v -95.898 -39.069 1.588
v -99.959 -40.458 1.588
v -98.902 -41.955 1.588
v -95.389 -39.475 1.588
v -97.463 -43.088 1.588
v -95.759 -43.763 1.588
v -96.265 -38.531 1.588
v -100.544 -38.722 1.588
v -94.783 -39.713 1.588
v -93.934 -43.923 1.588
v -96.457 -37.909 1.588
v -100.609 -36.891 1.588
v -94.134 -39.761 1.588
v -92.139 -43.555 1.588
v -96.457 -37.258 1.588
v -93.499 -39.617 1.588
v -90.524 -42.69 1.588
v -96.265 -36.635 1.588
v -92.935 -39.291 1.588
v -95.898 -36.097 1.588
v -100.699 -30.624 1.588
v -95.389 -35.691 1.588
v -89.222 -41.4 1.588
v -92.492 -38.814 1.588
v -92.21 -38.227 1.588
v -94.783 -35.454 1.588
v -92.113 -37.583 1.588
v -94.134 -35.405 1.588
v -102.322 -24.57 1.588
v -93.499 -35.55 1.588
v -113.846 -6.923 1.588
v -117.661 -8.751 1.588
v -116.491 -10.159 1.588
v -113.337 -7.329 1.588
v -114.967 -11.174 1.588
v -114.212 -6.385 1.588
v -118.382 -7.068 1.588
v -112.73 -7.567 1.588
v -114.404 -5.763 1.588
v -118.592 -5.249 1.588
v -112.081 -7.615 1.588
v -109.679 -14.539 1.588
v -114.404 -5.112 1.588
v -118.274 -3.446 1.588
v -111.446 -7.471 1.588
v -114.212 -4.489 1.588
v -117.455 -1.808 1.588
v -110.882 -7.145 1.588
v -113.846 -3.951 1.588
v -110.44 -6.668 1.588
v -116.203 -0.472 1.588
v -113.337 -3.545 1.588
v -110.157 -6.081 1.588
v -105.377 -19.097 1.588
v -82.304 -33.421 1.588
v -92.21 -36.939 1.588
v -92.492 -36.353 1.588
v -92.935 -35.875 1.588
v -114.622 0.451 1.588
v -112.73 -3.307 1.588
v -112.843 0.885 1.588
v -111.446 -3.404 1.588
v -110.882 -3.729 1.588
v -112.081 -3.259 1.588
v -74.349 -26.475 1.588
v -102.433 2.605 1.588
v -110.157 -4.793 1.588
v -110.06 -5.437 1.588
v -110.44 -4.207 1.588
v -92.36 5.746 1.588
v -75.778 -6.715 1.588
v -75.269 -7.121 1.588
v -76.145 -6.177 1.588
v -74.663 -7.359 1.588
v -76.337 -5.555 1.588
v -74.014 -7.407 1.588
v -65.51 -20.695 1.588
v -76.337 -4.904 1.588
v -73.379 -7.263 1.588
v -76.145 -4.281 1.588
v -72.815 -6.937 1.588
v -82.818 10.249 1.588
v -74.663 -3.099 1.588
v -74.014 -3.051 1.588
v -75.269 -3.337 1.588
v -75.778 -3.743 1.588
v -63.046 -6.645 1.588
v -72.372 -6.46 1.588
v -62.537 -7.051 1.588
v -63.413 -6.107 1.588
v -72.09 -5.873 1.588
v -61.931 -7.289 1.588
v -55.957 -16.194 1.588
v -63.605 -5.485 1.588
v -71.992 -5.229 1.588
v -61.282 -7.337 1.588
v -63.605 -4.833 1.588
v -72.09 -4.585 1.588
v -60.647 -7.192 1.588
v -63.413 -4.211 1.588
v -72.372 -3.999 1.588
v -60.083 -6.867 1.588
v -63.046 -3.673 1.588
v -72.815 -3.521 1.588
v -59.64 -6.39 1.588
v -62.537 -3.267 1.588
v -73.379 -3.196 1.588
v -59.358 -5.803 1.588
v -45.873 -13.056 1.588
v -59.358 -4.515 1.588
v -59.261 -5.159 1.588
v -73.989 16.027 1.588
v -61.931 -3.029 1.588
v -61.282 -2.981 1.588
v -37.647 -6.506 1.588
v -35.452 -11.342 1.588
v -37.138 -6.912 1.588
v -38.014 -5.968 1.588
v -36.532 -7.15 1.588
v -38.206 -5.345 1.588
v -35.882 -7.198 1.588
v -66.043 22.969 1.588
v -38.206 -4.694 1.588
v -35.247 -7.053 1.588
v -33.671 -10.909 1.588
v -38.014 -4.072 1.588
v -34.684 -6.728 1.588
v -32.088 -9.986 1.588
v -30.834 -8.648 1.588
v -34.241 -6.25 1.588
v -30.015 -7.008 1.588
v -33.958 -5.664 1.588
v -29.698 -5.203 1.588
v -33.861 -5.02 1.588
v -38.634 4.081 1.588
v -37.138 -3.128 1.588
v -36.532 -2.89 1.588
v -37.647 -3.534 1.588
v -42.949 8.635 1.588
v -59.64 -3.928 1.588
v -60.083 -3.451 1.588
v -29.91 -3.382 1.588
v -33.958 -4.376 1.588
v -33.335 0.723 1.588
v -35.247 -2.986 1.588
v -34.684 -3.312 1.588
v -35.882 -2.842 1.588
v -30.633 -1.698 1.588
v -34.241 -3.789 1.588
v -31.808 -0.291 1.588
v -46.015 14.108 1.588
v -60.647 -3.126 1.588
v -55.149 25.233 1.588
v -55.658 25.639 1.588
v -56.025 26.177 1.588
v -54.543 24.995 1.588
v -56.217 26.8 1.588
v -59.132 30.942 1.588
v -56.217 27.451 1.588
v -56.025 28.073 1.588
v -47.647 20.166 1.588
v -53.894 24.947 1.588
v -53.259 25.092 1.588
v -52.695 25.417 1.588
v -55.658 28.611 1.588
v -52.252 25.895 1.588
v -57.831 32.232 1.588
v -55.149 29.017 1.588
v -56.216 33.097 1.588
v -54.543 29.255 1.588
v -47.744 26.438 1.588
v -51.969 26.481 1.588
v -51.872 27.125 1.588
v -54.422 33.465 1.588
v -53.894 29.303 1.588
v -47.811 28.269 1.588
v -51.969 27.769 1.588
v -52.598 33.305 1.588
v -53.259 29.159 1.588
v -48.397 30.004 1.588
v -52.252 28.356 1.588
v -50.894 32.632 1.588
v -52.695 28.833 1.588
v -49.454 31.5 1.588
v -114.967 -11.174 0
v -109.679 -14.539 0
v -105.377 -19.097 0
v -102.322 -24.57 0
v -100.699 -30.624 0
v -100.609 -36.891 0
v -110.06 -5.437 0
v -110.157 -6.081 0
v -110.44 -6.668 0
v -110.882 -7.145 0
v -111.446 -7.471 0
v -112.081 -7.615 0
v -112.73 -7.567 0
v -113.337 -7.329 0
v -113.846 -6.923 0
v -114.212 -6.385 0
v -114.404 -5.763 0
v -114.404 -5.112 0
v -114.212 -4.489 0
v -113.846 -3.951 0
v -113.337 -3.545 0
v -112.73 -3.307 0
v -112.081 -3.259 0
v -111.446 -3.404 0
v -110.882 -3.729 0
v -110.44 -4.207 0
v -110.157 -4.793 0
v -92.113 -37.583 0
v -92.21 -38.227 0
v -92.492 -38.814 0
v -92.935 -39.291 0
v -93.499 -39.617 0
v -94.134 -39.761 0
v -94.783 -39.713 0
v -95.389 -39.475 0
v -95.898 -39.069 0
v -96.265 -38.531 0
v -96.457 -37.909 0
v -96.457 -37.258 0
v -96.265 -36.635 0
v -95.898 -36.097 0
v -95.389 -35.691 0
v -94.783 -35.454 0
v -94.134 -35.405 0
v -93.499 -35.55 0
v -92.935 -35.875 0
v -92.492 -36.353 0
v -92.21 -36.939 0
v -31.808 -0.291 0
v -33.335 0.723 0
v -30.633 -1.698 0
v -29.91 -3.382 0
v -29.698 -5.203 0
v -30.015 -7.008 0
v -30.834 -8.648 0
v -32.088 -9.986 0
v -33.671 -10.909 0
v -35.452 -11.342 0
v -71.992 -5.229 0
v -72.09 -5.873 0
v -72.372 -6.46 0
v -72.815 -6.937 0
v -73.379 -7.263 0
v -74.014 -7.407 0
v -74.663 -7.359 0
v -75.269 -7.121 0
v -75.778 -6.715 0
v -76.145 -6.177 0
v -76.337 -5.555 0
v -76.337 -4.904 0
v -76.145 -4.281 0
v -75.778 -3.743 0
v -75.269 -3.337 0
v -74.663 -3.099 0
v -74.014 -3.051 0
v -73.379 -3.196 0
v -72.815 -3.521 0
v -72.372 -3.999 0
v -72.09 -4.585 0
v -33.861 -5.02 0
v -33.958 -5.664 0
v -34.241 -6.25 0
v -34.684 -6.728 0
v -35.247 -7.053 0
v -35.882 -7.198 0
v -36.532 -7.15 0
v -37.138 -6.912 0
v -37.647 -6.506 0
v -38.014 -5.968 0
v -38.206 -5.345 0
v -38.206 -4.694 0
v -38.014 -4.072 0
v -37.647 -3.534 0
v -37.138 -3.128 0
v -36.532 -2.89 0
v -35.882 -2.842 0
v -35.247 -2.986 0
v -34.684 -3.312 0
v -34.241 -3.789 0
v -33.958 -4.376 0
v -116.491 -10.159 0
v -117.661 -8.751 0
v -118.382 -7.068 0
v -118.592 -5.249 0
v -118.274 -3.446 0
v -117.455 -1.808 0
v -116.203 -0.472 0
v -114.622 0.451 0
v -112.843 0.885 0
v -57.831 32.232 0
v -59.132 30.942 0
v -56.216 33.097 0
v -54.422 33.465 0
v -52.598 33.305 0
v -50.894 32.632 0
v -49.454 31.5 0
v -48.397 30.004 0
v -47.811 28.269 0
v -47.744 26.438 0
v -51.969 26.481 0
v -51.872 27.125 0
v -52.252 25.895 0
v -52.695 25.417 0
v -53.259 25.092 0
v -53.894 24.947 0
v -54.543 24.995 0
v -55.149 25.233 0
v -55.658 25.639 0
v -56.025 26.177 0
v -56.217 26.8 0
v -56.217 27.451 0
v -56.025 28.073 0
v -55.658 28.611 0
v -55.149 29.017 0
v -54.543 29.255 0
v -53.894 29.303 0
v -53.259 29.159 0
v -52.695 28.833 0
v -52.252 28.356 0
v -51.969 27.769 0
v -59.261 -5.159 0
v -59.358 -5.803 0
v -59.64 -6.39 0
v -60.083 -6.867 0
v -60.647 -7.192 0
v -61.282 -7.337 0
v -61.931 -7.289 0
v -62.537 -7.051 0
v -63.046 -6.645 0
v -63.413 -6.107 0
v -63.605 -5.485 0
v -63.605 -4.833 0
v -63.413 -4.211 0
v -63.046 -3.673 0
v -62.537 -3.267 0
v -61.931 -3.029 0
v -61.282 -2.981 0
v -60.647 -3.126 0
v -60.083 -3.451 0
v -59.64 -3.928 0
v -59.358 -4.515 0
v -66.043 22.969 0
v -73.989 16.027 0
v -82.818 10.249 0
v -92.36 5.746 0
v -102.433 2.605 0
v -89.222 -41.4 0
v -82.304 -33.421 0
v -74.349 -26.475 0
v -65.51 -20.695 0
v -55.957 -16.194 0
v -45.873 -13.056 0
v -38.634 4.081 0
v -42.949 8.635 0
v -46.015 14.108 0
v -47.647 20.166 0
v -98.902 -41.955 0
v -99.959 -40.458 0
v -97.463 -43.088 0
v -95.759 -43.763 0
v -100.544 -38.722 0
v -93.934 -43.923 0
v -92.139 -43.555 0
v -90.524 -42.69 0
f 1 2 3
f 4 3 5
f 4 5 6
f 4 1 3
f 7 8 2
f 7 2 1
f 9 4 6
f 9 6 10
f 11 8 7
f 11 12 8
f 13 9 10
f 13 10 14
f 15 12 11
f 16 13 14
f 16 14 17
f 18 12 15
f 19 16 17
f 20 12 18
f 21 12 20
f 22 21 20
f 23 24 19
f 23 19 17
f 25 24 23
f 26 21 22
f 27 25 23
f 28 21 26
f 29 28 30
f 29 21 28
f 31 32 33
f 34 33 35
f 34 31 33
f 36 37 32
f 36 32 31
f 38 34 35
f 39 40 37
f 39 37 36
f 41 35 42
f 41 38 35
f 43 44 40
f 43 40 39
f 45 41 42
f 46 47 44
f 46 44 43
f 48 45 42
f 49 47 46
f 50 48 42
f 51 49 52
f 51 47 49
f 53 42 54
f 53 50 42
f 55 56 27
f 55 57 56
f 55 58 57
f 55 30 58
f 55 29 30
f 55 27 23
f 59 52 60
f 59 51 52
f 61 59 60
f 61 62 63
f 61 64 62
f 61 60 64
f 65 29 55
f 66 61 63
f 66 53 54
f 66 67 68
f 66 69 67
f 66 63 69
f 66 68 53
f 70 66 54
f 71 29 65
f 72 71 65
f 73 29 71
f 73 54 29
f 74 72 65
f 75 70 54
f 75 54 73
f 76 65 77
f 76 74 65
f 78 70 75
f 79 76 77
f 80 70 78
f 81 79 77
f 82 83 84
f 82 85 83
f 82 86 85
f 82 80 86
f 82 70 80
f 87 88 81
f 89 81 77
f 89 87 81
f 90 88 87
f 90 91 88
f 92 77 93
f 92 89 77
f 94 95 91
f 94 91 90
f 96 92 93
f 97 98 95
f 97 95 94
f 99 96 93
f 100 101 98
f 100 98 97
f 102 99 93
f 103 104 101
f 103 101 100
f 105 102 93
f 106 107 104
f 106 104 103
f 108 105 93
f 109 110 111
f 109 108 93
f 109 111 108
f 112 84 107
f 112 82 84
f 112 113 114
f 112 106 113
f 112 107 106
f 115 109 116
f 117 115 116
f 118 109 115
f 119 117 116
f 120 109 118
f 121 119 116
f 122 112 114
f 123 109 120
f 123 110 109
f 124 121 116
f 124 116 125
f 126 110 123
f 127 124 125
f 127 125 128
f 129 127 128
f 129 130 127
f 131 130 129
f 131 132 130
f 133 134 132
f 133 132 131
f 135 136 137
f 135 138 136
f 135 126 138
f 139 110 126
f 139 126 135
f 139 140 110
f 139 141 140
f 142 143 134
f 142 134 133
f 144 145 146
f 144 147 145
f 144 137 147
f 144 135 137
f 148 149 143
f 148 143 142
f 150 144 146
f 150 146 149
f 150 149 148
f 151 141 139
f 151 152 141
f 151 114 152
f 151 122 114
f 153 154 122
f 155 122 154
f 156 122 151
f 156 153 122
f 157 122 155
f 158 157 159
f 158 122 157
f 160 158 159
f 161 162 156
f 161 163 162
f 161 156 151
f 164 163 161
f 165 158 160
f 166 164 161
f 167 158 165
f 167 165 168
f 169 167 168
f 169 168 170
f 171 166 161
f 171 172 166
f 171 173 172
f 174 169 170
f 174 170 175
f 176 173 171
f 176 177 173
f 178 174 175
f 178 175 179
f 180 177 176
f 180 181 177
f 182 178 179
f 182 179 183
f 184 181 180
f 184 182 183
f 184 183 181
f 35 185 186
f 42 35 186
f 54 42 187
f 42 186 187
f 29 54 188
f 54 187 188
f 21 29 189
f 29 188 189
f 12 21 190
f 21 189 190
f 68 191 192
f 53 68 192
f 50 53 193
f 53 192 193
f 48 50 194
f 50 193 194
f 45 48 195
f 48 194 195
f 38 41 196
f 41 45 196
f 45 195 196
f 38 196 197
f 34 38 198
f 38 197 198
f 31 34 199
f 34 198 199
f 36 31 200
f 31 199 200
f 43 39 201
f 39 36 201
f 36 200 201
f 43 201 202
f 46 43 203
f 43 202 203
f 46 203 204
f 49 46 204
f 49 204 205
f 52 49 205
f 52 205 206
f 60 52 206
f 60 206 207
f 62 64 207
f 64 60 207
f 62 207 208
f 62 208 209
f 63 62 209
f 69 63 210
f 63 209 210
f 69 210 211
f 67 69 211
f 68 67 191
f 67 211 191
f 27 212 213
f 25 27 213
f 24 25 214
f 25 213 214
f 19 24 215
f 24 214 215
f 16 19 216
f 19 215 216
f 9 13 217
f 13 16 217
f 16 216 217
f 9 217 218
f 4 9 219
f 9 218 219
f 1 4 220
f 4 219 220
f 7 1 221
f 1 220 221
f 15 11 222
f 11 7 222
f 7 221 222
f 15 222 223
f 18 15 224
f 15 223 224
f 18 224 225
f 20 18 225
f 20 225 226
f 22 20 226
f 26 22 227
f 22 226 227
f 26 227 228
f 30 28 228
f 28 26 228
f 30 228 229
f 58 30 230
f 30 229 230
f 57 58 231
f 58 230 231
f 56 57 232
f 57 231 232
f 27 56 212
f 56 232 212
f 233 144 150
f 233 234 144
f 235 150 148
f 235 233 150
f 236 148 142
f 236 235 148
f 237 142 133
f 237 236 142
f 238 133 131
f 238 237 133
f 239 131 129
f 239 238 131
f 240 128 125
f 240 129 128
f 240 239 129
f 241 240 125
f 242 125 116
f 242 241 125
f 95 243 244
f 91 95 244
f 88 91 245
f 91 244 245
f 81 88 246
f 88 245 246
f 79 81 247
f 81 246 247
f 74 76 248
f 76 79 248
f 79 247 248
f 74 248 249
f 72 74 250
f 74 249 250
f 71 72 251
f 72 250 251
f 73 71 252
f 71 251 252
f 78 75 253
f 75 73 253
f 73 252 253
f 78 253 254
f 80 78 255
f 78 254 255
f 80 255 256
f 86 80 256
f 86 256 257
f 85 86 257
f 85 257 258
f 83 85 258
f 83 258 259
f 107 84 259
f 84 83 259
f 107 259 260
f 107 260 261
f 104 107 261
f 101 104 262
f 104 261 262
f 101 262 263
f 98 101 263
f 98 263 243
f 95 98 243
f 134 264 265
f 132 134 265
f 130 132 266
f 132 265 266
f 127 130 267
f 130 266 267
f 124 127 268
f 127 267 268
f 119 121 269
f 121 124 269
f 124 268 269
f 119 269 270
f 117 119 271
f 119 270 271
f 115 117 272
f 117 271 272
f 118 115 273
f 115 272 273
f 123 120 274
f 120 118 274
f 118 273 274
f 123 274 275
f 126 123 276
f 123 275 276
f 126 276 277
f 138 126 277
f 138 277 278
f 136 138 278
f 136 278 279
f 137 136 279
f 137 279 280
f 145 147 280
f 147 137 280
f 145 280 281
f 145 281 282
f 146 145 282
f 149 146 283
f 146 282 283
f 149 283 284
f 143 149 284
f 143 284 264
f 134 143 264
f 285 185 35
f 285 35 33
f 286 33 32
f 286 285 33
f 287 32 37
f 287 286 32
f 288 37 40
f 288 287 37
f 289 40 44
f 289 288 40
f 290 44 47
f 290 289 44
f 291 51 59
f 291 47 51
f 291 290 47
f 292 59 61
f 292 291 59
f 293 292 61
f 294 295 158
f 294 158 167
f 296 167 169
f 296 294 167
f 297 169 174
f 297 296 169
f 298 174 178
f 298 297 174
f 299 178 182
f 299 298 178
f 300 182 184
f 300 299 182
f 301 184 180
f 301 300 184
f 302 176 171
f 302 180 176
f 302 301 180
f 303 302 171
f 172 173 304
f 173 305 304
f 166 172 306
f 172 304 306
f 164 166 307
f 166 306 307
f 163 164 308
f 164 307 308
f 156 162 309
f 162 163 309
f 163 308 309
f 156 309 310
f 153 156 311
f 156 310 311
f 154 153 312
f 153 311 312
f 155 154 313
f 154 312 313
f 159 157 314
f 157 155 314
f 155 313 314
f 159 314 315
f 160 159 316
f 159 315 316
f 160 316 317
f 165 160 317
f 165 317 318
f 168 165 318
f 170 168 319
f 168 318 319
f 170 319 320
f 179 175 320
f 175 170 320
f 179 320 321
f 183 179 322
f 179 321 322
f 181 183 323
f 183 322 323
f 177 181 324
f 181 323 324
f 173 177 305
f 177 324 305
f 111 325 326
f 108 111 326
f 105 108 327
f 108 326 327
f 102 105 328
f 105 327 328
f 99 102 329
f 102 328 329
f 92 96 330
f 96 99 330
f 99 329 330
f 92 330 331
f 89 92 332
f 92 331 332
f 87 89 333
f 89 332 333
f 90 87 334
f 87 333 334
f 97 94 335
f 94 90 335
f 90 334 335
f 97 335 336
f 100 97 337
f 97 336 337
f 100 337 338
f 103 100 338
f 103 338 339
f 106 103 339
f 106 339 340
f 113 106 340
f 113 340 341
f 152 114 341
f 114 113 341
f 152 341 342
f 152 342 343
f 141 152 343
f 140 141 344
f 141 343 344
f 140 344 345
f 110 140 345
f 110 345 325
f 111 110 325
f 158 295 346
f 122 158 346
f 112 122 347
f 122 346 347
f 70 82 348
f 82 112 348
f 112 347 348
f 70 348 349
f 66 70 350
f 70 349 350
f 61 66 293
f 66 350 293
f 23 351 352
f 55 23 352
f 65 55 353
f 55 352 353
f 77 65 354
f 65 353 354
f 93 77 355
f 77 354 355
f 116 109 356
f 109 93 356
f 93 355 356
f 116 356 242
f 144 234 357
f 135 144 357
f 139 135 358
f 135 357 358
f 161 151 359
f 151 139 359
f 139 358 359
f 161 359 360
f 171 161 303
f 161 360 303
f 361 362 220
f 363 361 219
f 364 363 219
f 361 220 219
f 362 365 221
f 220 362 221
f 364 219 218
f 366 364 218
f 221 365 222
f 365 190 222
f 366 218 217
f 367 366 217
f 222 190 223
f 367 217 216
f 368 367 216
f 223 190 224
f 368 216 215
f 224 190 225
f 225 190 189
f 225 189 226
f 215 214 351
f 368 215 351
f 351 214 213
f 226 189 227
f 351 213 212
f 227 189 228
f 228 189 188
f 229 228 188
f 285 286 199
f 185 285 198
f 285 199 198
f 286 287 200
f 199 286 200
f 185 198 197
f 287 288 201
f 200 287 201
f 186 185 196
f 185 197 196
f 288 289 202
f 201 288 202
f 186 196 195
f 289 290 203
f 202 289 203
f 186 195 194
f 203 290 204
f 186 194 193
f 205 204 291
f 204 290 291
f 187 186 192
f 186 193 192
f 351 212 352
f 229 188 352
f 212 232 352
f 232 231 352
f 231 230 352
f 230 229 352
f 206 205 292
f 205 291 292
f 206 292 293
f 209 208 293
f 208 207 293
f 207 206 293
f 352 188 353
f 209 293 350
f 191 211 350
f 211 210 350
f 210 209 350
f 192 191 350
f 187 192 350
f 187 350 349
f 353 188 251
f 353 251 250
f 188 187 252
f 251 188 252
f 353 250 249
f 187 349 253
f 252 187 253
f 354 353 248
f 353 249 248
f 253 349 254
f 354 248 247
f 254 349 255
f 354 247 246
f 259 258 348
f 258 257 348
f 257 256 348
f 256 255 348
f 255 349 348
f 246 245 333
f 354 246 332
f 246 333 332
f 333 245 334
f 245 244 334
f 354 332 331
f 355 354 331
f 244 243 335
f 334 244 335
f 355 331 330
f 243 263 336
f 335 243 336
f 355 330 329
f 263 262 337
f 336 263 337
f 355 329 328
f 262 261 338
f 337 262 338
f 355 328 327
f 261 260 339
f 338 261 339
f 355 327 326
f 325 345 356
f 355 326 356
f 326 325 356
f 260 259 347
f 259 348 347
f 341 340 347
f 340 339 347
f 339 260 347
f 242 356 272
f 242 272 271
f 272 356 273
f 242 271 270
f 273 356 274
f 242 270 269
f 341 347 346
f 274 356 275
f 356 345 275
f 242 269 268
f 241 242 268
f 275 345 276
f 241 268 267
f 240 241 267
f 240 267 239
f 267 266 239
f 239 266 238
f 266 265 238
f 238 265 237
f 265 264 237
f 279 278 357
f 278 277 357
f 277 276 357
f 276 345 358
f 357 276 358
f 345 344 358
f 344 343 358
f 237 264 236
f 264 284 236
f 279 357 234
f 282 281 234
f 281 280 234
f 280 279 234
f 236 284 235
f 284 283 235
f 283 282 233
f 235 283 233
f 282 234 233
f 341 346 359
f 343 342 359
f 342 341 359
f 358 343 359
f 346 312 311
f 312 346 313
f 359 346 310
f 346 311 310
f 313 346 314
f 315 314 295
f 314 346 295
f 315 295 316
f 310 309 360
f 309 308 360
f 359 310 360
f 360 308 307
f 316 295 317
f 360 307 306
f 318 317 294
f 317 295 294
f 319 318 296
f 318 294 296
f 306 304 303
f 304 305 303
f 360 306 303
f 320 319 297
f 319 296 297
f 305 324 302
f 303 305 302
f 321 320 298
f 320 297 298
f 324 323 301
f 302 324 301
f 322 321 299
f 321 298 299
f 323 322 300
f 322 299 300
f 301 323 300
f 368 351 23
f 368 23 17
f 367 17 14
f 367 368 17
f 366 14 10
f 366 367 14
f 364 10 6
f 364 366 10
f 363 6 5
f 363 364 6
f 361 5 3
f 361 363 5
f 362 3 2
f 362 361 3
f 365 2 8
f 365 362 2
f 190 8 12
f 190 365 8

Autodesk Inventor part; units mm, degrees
ref_plane "YZ Plane" through (0, 0, 0) normal (1, 0, 0) x (0, 1, 0)
ref_plane "XZ Plane" through (0, 0, 0) normal (0, 1, 0) x (-1, 0, 0)
ref_plane "XY Plane" through (0, 0, 0) normal (0, 0, 1) x (1, 0, 0)
sketch "Sketch1" plane through (0, 0, 0) normal (0, 0, 1) x (1, 0, 0)
  circle A0 centre (-74.1769, -5.2291) radius 2.1844
  circle A1 centre (-36.0455, -5.0199) radius 2.1844
  circle A2 centre (-112.2444, -5.4371) radius 2.1844
  circle A3 centre (-94.297, -37.5832) radius 2.1844
  circle A4 centre (-54.0568, 27.1251) radius 2.1844
  arc A5 (-35.4519, -11.3421) -> (-89.2225, -41.4005) centre (-28.3285, -87.2084) ccw
  arc A6 (-100.6091, -36.8907) -> (-114.967, -11.1738) centre (-125.8576, -34.1206) ccw
  arc A7 (-112.8432, 0.8846) -> (-59.1316, 30.942) centre (-120.0293, 76.745) ccw
  arc A8 (-47.7441, 26.4385) -> (-33.335, 0.7226) centre (-22.4929, 23.6923) ccw
  arc A9 (-35.4519, -11.3421) -> (-33.335, 0.7226) centre (-36.0455, -5.0199) ccw
  arc A10 (-100.6091, -36.8907) -> (-89.2225, -41.4005) centre (-94.297, -37.5832) ccw
  arc A11 (-112.8432, 0.8846) -> (-114.967, -11.1738) centre (-112.2444, -5.4371) ccw
  arc A12 (-47.7441, 26.4385) -> (-59.1316, 30.942) centre (-54.0568, 27.1251) ccw
  circle A13 centre (-61.4451, -5.159) radius 2.1844
  point P0 (-47.7441, 26.4385)
  dimension "d6" = 25.4
  dimension "d7" = 25.4
  dimension "d8" = 76.2
  dimension "d9" = 76.2
extrude "Extrusion2" add sketch "Sketch1" along normal blind 1.5875
properties part number "Side Poly"
